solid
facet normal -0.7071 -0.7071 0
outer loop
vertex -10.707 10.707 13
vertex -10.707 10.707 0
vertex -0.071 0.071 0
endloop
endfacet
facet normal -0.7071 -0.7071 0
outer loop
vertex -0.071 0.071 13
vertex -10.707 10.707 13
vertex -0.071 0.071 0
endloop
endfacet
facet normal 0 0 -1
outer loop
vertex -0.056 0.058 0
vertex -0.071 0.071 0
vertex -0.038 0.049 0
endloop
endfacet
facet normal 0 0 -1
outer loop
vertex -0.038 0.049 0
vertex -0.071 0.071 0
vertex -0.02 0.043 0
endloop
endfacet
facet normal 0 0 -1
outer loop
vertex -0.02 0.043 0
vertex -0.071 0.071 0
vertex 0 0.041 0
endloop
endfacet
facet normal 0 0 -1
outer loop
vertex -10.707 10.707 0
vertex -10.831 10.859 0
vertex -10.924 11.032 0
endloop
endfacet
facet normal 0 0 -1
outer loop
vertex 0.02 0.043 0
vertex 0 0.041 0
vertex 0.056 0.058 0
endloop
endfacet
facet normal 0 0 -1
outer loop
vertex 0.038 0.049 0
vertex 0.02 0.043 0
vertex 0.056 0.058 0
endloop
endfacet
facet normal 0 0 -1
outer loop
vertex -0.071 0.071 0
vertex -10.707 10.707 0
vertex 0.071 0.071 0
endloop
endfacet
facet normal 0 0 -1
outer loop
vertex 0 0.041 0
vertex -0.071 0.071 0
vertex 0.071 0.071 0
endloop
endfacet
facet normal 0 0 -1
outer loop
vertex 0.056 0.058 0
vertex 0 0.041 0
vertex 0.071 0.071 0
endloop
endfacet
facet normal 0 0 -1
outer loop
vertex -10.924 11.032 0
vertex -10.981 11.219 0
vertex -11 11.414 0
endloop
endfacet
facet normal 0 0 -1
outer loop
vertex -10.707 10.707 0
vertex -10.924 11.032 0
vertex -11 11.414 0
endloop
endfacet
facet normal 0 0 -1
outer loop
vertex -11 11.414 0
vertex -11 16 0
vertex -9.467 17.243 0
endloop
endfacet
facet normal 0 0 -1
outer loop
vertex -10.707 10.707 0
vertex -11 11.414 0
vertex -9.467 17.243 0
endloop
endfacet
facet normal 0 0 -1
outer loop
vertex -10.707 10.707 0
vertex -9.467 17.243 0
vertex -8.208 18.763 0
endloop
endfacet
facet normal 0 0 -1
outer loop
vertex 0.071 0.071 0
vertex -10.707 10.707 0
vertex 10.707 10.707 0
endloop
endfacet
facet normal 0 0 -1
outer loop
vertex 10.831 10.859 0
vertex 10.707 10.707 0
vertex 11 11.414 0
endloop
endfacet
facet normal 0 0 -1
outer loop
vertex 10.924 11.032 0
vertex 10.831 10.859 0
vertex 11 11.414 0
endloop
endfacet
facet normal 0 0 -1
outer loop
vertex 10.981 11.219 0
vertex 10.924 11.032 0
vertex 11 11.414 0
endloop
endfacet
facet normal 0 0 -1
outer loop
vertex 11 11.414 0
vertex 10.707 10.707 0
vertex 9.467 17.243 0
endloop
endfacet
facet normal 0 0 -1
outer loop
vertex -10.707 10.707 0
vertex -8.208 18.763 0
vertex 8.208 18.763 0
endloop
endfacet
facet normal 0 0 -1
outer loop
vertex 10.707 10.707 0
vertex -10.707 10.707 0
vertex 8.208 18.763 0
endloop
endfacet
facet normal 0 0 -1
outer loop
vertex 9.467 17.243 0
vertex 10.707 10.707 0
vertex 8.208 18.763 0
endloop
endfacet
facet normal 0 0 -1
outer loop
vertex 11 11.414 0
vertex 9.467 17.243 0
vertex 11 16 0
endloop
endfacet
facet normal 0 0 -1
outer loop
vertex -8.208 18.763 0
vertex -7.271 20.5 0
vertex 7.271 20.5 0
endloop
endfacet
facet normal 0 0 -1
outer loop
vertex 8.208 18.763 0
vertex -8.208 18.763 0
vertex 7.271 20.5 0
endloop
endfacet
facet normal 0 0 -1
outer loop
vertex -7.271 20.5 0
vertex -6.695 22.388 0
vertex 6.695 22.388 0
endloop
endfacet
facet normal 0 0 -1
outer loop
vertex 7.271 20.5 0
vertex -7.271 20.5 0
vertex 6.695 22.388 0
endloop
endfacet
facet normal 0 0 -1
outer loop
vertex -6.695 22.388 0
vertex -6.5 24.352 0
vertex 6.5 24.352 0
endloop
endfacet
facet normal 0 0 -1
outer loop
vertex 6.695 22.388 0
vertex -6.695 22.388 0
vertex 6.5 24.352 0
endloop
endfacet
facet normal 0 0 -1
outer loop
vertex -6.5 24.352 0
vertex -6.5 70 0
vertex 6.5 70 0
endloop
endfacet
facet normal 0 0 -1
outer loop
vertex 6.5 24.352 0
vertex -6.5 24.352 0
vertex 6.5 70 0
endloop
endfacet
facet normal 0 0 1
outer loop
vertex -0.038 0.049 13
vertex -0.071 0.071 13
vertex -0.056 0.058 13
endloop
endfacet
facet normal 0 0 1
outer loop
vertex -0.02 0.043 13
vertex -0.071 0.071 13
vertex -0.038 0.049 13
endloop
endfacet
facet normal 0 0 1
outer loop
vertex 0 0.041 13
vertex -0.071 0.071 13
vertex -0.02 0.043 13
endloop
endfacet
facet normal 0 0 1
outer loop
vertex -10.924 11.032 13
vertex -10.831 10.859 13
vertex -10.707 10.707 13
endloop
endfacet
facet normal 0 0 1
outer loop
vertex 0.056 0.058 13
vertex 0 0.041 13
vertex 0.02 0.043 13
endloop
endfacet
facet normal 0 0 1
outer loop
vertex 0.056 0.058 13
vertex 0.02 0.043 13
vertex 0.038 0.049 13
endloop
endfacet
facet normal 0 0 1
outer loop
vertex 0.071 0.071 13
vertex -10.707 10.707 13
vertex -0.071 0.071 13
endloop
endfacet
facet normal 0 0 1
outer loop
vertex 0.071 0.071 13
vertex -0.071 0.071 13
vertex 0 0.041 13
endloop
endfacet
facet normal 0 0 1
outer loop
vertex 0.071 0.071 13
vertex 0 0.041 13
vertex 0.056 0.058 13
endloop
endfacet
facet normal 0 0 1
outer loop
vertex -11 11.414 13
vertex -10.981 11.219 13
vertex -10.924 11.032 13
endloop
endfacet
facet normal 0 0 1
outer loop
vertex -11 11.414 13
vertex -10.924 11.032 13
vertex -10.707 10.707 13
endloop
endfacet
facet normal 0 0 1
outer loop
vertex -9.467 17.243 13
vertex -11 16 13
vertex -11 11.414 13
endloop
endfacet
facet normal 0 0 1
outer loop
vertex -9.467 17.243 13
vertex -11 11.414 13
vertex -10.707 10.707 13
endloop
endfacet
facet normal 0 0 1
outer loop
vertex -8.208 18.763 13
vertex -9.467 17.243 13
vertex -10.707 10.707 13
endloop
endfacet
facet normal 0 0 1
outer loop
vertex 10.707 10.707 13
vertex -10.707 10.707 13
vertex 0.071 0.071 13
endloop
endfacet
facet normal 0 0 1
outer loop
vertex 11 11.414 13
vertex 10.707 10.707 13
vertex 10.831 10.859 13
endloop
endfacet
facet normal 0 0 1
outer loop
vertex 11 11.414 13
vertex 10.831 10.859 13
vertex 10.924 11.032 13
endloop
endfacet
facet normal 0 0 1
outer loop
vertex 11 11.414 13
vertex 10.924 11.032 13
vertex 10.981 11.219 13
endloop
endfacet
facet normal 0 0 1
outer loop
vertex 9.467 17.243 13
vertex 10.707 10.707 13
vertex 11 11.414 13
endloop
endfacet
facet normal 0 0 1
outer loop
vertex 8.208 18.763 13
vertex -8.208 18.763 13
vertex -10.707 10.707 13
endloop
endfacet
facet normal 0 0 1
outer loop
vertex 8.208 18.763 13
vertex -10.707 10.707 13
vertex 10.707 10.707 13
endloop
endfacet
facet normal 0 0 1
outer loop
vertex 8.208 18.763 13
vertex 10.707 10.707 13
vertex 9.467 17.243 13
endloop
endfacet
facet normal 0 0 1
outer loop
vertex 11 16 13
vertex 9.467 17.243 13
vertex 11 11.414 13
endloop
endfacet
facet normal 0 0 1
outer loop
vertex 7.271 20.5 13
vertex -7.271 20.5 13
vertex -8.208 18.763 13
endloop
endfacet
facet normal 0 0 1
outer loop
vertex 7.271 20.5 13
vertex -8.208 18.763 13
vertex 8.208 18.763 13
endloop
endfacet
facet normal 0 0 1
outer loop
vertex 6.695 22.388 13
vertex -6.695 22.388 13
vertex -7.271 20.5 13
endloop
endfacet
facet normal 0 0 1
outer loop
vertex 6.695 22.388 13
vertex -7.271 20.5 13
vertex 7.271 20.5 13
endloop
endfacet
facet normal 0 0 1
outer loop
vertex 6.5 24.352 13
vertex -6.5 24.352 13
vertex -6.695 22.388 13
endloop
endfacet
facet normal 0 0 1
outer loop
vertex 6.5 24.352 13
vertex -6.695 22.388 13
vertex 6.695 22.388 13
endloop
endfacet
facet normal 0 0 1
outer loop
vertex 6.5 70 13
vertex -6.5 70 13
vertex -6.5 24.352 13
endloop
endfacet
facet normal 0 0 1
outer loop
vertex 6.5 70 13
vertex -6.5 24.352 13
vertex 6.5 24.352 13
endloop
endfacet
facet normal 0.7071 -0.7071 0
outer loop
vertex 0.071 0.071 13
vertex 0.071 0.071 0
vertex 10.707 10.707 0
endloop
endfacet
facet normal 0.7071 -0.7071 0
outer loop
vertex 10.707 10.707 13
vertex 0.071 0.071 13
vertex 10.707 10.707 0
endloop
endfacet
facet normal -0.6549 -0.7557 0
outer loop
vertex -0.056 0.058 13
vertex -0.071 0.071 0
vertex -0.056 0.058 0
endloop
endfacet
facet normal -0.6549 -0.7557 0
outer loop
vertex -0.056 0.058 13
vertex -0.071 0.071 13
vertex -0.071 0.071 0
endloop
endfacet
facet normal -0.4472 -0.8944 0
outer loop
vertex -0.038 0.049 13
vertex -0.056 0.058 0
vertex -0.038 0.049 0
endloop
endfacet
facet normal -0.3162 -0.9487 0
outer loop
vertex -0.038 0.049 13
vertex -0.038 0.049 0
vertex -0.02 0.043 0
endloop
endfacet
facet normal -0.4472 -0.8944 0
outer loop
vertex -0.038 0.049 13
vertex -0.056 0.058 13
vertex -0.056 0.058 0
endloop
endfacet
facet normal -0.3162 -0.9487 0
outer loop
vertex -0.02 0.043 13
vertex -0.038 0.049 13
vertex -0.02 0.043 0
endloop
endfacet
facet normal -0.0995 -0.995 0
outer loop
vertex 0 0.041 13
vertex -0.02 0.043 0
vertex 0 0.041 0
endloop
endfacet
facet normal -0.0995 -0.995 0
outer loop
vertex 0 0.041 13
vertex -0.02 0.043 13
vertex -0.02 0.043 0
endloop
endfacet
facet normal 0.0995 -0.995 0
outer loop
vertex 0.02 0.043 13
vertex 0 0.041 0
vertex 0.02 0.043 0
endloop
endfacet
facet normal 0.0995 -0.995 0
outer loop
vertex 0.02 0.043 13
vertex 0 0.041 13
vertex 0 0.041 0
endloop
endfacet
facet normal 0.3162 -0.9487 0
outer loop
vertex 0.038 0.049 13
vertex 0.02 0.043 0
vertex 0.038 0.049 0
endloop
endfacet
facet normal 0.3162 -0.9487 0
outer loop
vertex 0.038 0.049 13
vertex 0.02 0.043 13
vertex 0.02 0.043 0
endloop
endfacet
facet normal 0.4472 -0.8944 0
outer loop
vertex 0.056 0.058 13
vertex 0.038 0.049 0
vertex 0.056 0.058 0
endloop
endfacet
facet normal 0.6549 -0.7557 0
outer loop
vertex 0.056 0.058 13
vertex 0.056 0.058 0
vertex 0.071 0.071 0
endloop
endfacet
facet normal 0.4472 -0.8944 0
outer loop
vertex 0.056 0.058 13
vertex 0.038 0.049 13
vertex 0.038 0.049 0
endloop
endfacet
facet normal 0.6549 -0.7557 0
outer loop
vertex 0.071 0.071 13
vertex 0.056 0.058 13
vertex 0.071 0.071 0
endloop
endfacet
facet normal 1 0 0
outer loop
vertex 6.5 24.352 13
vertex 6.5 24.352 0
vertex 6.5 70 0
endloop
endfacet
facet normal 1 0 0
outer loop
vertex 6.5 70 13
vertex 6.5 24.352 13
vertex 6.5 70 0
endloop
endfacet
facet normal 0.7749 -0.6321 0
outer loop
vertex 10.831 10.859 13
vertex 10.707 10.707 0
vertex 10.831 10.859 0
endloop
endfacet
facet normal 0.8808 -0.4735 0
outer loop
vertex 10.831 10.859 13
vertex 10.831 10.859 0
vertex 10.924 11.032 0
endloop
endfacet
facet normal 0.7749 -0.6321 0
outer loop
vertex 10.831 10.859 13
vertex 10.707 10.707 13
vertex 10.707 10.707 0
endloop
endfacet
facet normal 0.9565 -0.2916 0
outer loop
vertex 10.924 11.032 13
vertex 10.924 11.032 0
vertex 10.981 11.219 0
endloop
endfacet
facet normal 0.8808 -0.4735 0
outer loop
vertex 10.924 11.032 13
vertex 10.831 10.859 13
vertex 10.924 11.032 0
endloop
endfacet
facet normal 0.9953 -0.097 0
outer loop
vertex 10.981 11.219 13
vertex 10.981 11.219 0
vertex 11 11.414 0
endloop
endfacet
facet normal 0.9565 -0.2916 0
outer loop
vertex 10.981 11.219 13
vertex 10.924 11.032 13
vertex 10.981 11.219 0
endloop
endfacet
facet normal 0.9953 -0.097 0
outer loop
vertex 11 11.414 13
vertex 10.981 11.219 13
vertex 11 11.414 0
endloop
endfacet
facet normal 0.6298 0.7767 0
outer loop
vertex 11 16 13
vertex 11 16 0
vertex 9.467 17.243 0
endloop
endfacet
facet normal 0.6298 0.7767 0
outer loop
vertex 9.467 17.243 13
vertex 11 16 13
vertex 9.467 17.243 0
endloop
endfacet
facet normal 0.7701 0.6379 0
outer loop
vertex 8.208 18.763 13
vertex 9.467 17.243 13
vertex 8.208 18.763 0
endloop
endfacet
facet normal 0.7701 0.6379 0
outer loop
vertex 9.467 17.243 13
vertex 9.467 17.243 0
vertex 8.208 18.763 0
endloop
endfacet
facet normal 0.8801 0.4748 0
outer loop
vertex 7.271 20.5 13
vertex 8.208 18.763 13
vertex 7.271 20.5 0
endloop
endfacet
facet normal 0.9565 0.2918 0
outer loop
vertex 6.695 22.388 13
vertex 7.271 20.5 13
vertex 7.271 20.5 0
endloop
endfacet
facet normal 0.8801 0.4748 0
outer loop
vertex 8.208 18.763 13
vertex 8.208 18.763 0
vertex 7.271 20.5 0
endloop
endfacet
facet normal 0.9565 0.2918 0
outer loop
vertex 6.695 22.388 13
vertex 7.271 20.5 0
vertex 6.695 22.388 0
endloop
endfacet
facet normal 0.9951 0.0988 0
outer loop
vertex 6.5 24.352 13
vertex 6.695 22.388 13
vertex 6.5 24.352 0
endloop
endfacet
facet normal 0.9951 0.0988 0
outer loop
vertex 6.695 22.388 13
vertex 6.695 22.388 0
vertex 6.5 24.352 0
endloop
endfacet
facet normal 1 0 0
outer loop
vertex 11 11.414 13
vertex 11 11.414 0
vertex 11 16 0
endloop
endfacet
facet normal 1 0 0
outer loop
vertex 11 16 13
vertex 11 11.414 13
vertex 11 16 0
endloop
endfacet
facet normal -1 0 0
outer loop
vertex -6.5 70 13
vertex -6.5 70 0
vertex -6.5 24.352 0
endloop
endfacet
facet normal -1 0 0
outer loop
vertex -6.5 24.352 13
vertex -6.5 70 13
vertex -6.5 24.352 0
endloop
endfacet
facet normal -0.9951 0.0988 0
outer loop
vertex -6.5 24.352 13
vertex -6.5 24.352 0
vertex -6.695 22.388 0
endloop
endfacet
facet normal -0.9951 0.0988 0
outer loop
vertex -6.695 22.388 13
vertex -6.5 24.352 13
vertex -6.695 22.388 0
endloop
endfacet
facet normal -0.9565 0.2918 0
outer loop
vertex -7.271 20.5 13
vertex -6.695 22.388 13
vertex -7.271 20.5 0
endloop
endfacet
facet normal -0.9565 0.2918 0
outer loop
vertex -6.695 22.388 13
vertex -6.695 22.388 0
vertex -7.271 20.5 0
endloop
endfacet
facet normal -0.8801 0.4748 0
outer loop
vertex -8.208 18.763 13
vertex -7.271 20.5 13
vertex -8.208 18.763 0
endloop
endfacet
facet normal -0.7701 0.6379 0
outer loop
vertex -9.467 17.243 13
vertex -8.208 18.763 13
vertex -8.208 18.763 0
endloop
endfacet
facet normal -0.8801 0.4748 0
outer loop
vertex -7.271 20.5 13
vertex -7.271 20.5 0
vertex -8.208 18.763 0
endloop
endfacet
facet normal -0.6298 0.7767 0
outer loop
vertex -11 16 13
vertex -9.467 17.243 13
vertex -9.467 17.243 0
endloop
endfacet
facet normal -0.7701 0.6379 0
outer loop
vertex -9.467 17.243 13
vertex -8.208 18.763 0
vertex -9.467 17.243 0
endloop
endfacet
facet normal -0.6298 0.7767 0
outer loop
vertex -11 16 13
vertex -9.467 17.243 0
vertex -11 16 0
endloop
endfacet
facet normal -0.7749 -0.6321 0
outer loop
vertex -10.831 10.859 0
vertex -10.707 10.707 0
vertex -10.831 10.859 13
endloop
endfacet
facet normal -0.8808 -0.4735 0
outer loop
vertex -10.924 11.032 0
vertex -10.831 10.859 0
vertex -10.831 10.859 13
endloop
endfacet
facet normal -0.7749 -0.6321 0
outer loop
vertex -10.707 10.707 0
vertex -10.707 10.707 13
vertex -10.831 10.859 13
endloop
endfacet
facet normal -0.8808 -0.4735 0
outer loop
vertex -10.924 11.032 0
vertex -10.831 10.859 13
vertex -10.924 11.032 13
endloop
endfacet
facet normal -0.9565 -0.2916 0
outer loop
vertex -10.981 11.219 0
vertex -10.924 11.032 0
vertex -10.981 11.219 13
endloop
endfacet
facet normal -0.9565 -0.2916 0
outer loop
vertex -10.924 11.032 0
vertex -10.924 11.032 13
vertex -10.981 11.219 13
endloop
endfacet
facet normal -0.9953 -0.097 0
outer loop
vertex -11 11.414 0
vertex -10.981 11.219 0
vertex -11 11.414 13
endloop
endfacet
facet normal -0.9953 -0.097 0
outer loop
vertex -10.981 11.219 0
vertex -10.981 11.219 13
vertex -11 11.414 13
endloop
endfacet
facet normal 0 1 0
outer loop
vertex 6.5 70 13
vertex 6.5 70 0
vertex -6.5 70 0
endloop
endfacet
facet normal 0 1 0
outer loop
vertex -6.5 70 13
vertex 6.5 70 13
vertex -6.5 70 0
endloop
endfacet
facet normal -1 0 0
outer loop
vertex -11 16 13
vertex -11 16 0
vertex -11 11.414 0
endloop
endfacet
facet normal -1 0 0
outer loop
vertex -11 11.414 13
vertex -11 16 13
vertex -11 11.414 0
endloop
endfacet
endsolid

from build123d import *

# Parameters (mm, degrees)
F1_DEPTH = 13
F2_R     = 0.1
F3_R     = 1


with BuildPart() as f1:
    # F0 (on Top) → F1 (new body)
    with BuildSketch(Plane.XY):
        with BuildLine():
            Line((6.5, 24.351647), (6.5, 70))
            Line((6.5, 70), (0, 70))
            Line((0, 70), (-6.5, 70))
            Line((-6.5, 70), (-6.5, 24.351647))
            ThreePointArc((-6.5, 24.351647), (-7.696592, 19.60823), (-11, 16))
            Line((-11, 16), (-11, 11))
            Line((-11, 11), (0, 0))
            Line((0, 0), (11, 11))
            Line((11, 11), (11, 16))
            ThreePointArc((11, 16), (7.696592, 19.60823), (6.5, 24.351647))
        make_face()
    extrude(amount=F1_DEPTH)

    # F2
    f2_edges = [f1.edges().sort_by_distance(p)[0] for p in [
        (0, 0, 6.5),
    ]]
    fillet(f2_edges, radius=F2_R)

    # F3
    f3_edges = [f1.edges().sort_by_distance(p)[0] for p in [
        (-11, 11, 6.5),
        (11, 11, 6.5),
    ]]
    fillet(f3_edges, radius=F3_R)


solid = f1.part
